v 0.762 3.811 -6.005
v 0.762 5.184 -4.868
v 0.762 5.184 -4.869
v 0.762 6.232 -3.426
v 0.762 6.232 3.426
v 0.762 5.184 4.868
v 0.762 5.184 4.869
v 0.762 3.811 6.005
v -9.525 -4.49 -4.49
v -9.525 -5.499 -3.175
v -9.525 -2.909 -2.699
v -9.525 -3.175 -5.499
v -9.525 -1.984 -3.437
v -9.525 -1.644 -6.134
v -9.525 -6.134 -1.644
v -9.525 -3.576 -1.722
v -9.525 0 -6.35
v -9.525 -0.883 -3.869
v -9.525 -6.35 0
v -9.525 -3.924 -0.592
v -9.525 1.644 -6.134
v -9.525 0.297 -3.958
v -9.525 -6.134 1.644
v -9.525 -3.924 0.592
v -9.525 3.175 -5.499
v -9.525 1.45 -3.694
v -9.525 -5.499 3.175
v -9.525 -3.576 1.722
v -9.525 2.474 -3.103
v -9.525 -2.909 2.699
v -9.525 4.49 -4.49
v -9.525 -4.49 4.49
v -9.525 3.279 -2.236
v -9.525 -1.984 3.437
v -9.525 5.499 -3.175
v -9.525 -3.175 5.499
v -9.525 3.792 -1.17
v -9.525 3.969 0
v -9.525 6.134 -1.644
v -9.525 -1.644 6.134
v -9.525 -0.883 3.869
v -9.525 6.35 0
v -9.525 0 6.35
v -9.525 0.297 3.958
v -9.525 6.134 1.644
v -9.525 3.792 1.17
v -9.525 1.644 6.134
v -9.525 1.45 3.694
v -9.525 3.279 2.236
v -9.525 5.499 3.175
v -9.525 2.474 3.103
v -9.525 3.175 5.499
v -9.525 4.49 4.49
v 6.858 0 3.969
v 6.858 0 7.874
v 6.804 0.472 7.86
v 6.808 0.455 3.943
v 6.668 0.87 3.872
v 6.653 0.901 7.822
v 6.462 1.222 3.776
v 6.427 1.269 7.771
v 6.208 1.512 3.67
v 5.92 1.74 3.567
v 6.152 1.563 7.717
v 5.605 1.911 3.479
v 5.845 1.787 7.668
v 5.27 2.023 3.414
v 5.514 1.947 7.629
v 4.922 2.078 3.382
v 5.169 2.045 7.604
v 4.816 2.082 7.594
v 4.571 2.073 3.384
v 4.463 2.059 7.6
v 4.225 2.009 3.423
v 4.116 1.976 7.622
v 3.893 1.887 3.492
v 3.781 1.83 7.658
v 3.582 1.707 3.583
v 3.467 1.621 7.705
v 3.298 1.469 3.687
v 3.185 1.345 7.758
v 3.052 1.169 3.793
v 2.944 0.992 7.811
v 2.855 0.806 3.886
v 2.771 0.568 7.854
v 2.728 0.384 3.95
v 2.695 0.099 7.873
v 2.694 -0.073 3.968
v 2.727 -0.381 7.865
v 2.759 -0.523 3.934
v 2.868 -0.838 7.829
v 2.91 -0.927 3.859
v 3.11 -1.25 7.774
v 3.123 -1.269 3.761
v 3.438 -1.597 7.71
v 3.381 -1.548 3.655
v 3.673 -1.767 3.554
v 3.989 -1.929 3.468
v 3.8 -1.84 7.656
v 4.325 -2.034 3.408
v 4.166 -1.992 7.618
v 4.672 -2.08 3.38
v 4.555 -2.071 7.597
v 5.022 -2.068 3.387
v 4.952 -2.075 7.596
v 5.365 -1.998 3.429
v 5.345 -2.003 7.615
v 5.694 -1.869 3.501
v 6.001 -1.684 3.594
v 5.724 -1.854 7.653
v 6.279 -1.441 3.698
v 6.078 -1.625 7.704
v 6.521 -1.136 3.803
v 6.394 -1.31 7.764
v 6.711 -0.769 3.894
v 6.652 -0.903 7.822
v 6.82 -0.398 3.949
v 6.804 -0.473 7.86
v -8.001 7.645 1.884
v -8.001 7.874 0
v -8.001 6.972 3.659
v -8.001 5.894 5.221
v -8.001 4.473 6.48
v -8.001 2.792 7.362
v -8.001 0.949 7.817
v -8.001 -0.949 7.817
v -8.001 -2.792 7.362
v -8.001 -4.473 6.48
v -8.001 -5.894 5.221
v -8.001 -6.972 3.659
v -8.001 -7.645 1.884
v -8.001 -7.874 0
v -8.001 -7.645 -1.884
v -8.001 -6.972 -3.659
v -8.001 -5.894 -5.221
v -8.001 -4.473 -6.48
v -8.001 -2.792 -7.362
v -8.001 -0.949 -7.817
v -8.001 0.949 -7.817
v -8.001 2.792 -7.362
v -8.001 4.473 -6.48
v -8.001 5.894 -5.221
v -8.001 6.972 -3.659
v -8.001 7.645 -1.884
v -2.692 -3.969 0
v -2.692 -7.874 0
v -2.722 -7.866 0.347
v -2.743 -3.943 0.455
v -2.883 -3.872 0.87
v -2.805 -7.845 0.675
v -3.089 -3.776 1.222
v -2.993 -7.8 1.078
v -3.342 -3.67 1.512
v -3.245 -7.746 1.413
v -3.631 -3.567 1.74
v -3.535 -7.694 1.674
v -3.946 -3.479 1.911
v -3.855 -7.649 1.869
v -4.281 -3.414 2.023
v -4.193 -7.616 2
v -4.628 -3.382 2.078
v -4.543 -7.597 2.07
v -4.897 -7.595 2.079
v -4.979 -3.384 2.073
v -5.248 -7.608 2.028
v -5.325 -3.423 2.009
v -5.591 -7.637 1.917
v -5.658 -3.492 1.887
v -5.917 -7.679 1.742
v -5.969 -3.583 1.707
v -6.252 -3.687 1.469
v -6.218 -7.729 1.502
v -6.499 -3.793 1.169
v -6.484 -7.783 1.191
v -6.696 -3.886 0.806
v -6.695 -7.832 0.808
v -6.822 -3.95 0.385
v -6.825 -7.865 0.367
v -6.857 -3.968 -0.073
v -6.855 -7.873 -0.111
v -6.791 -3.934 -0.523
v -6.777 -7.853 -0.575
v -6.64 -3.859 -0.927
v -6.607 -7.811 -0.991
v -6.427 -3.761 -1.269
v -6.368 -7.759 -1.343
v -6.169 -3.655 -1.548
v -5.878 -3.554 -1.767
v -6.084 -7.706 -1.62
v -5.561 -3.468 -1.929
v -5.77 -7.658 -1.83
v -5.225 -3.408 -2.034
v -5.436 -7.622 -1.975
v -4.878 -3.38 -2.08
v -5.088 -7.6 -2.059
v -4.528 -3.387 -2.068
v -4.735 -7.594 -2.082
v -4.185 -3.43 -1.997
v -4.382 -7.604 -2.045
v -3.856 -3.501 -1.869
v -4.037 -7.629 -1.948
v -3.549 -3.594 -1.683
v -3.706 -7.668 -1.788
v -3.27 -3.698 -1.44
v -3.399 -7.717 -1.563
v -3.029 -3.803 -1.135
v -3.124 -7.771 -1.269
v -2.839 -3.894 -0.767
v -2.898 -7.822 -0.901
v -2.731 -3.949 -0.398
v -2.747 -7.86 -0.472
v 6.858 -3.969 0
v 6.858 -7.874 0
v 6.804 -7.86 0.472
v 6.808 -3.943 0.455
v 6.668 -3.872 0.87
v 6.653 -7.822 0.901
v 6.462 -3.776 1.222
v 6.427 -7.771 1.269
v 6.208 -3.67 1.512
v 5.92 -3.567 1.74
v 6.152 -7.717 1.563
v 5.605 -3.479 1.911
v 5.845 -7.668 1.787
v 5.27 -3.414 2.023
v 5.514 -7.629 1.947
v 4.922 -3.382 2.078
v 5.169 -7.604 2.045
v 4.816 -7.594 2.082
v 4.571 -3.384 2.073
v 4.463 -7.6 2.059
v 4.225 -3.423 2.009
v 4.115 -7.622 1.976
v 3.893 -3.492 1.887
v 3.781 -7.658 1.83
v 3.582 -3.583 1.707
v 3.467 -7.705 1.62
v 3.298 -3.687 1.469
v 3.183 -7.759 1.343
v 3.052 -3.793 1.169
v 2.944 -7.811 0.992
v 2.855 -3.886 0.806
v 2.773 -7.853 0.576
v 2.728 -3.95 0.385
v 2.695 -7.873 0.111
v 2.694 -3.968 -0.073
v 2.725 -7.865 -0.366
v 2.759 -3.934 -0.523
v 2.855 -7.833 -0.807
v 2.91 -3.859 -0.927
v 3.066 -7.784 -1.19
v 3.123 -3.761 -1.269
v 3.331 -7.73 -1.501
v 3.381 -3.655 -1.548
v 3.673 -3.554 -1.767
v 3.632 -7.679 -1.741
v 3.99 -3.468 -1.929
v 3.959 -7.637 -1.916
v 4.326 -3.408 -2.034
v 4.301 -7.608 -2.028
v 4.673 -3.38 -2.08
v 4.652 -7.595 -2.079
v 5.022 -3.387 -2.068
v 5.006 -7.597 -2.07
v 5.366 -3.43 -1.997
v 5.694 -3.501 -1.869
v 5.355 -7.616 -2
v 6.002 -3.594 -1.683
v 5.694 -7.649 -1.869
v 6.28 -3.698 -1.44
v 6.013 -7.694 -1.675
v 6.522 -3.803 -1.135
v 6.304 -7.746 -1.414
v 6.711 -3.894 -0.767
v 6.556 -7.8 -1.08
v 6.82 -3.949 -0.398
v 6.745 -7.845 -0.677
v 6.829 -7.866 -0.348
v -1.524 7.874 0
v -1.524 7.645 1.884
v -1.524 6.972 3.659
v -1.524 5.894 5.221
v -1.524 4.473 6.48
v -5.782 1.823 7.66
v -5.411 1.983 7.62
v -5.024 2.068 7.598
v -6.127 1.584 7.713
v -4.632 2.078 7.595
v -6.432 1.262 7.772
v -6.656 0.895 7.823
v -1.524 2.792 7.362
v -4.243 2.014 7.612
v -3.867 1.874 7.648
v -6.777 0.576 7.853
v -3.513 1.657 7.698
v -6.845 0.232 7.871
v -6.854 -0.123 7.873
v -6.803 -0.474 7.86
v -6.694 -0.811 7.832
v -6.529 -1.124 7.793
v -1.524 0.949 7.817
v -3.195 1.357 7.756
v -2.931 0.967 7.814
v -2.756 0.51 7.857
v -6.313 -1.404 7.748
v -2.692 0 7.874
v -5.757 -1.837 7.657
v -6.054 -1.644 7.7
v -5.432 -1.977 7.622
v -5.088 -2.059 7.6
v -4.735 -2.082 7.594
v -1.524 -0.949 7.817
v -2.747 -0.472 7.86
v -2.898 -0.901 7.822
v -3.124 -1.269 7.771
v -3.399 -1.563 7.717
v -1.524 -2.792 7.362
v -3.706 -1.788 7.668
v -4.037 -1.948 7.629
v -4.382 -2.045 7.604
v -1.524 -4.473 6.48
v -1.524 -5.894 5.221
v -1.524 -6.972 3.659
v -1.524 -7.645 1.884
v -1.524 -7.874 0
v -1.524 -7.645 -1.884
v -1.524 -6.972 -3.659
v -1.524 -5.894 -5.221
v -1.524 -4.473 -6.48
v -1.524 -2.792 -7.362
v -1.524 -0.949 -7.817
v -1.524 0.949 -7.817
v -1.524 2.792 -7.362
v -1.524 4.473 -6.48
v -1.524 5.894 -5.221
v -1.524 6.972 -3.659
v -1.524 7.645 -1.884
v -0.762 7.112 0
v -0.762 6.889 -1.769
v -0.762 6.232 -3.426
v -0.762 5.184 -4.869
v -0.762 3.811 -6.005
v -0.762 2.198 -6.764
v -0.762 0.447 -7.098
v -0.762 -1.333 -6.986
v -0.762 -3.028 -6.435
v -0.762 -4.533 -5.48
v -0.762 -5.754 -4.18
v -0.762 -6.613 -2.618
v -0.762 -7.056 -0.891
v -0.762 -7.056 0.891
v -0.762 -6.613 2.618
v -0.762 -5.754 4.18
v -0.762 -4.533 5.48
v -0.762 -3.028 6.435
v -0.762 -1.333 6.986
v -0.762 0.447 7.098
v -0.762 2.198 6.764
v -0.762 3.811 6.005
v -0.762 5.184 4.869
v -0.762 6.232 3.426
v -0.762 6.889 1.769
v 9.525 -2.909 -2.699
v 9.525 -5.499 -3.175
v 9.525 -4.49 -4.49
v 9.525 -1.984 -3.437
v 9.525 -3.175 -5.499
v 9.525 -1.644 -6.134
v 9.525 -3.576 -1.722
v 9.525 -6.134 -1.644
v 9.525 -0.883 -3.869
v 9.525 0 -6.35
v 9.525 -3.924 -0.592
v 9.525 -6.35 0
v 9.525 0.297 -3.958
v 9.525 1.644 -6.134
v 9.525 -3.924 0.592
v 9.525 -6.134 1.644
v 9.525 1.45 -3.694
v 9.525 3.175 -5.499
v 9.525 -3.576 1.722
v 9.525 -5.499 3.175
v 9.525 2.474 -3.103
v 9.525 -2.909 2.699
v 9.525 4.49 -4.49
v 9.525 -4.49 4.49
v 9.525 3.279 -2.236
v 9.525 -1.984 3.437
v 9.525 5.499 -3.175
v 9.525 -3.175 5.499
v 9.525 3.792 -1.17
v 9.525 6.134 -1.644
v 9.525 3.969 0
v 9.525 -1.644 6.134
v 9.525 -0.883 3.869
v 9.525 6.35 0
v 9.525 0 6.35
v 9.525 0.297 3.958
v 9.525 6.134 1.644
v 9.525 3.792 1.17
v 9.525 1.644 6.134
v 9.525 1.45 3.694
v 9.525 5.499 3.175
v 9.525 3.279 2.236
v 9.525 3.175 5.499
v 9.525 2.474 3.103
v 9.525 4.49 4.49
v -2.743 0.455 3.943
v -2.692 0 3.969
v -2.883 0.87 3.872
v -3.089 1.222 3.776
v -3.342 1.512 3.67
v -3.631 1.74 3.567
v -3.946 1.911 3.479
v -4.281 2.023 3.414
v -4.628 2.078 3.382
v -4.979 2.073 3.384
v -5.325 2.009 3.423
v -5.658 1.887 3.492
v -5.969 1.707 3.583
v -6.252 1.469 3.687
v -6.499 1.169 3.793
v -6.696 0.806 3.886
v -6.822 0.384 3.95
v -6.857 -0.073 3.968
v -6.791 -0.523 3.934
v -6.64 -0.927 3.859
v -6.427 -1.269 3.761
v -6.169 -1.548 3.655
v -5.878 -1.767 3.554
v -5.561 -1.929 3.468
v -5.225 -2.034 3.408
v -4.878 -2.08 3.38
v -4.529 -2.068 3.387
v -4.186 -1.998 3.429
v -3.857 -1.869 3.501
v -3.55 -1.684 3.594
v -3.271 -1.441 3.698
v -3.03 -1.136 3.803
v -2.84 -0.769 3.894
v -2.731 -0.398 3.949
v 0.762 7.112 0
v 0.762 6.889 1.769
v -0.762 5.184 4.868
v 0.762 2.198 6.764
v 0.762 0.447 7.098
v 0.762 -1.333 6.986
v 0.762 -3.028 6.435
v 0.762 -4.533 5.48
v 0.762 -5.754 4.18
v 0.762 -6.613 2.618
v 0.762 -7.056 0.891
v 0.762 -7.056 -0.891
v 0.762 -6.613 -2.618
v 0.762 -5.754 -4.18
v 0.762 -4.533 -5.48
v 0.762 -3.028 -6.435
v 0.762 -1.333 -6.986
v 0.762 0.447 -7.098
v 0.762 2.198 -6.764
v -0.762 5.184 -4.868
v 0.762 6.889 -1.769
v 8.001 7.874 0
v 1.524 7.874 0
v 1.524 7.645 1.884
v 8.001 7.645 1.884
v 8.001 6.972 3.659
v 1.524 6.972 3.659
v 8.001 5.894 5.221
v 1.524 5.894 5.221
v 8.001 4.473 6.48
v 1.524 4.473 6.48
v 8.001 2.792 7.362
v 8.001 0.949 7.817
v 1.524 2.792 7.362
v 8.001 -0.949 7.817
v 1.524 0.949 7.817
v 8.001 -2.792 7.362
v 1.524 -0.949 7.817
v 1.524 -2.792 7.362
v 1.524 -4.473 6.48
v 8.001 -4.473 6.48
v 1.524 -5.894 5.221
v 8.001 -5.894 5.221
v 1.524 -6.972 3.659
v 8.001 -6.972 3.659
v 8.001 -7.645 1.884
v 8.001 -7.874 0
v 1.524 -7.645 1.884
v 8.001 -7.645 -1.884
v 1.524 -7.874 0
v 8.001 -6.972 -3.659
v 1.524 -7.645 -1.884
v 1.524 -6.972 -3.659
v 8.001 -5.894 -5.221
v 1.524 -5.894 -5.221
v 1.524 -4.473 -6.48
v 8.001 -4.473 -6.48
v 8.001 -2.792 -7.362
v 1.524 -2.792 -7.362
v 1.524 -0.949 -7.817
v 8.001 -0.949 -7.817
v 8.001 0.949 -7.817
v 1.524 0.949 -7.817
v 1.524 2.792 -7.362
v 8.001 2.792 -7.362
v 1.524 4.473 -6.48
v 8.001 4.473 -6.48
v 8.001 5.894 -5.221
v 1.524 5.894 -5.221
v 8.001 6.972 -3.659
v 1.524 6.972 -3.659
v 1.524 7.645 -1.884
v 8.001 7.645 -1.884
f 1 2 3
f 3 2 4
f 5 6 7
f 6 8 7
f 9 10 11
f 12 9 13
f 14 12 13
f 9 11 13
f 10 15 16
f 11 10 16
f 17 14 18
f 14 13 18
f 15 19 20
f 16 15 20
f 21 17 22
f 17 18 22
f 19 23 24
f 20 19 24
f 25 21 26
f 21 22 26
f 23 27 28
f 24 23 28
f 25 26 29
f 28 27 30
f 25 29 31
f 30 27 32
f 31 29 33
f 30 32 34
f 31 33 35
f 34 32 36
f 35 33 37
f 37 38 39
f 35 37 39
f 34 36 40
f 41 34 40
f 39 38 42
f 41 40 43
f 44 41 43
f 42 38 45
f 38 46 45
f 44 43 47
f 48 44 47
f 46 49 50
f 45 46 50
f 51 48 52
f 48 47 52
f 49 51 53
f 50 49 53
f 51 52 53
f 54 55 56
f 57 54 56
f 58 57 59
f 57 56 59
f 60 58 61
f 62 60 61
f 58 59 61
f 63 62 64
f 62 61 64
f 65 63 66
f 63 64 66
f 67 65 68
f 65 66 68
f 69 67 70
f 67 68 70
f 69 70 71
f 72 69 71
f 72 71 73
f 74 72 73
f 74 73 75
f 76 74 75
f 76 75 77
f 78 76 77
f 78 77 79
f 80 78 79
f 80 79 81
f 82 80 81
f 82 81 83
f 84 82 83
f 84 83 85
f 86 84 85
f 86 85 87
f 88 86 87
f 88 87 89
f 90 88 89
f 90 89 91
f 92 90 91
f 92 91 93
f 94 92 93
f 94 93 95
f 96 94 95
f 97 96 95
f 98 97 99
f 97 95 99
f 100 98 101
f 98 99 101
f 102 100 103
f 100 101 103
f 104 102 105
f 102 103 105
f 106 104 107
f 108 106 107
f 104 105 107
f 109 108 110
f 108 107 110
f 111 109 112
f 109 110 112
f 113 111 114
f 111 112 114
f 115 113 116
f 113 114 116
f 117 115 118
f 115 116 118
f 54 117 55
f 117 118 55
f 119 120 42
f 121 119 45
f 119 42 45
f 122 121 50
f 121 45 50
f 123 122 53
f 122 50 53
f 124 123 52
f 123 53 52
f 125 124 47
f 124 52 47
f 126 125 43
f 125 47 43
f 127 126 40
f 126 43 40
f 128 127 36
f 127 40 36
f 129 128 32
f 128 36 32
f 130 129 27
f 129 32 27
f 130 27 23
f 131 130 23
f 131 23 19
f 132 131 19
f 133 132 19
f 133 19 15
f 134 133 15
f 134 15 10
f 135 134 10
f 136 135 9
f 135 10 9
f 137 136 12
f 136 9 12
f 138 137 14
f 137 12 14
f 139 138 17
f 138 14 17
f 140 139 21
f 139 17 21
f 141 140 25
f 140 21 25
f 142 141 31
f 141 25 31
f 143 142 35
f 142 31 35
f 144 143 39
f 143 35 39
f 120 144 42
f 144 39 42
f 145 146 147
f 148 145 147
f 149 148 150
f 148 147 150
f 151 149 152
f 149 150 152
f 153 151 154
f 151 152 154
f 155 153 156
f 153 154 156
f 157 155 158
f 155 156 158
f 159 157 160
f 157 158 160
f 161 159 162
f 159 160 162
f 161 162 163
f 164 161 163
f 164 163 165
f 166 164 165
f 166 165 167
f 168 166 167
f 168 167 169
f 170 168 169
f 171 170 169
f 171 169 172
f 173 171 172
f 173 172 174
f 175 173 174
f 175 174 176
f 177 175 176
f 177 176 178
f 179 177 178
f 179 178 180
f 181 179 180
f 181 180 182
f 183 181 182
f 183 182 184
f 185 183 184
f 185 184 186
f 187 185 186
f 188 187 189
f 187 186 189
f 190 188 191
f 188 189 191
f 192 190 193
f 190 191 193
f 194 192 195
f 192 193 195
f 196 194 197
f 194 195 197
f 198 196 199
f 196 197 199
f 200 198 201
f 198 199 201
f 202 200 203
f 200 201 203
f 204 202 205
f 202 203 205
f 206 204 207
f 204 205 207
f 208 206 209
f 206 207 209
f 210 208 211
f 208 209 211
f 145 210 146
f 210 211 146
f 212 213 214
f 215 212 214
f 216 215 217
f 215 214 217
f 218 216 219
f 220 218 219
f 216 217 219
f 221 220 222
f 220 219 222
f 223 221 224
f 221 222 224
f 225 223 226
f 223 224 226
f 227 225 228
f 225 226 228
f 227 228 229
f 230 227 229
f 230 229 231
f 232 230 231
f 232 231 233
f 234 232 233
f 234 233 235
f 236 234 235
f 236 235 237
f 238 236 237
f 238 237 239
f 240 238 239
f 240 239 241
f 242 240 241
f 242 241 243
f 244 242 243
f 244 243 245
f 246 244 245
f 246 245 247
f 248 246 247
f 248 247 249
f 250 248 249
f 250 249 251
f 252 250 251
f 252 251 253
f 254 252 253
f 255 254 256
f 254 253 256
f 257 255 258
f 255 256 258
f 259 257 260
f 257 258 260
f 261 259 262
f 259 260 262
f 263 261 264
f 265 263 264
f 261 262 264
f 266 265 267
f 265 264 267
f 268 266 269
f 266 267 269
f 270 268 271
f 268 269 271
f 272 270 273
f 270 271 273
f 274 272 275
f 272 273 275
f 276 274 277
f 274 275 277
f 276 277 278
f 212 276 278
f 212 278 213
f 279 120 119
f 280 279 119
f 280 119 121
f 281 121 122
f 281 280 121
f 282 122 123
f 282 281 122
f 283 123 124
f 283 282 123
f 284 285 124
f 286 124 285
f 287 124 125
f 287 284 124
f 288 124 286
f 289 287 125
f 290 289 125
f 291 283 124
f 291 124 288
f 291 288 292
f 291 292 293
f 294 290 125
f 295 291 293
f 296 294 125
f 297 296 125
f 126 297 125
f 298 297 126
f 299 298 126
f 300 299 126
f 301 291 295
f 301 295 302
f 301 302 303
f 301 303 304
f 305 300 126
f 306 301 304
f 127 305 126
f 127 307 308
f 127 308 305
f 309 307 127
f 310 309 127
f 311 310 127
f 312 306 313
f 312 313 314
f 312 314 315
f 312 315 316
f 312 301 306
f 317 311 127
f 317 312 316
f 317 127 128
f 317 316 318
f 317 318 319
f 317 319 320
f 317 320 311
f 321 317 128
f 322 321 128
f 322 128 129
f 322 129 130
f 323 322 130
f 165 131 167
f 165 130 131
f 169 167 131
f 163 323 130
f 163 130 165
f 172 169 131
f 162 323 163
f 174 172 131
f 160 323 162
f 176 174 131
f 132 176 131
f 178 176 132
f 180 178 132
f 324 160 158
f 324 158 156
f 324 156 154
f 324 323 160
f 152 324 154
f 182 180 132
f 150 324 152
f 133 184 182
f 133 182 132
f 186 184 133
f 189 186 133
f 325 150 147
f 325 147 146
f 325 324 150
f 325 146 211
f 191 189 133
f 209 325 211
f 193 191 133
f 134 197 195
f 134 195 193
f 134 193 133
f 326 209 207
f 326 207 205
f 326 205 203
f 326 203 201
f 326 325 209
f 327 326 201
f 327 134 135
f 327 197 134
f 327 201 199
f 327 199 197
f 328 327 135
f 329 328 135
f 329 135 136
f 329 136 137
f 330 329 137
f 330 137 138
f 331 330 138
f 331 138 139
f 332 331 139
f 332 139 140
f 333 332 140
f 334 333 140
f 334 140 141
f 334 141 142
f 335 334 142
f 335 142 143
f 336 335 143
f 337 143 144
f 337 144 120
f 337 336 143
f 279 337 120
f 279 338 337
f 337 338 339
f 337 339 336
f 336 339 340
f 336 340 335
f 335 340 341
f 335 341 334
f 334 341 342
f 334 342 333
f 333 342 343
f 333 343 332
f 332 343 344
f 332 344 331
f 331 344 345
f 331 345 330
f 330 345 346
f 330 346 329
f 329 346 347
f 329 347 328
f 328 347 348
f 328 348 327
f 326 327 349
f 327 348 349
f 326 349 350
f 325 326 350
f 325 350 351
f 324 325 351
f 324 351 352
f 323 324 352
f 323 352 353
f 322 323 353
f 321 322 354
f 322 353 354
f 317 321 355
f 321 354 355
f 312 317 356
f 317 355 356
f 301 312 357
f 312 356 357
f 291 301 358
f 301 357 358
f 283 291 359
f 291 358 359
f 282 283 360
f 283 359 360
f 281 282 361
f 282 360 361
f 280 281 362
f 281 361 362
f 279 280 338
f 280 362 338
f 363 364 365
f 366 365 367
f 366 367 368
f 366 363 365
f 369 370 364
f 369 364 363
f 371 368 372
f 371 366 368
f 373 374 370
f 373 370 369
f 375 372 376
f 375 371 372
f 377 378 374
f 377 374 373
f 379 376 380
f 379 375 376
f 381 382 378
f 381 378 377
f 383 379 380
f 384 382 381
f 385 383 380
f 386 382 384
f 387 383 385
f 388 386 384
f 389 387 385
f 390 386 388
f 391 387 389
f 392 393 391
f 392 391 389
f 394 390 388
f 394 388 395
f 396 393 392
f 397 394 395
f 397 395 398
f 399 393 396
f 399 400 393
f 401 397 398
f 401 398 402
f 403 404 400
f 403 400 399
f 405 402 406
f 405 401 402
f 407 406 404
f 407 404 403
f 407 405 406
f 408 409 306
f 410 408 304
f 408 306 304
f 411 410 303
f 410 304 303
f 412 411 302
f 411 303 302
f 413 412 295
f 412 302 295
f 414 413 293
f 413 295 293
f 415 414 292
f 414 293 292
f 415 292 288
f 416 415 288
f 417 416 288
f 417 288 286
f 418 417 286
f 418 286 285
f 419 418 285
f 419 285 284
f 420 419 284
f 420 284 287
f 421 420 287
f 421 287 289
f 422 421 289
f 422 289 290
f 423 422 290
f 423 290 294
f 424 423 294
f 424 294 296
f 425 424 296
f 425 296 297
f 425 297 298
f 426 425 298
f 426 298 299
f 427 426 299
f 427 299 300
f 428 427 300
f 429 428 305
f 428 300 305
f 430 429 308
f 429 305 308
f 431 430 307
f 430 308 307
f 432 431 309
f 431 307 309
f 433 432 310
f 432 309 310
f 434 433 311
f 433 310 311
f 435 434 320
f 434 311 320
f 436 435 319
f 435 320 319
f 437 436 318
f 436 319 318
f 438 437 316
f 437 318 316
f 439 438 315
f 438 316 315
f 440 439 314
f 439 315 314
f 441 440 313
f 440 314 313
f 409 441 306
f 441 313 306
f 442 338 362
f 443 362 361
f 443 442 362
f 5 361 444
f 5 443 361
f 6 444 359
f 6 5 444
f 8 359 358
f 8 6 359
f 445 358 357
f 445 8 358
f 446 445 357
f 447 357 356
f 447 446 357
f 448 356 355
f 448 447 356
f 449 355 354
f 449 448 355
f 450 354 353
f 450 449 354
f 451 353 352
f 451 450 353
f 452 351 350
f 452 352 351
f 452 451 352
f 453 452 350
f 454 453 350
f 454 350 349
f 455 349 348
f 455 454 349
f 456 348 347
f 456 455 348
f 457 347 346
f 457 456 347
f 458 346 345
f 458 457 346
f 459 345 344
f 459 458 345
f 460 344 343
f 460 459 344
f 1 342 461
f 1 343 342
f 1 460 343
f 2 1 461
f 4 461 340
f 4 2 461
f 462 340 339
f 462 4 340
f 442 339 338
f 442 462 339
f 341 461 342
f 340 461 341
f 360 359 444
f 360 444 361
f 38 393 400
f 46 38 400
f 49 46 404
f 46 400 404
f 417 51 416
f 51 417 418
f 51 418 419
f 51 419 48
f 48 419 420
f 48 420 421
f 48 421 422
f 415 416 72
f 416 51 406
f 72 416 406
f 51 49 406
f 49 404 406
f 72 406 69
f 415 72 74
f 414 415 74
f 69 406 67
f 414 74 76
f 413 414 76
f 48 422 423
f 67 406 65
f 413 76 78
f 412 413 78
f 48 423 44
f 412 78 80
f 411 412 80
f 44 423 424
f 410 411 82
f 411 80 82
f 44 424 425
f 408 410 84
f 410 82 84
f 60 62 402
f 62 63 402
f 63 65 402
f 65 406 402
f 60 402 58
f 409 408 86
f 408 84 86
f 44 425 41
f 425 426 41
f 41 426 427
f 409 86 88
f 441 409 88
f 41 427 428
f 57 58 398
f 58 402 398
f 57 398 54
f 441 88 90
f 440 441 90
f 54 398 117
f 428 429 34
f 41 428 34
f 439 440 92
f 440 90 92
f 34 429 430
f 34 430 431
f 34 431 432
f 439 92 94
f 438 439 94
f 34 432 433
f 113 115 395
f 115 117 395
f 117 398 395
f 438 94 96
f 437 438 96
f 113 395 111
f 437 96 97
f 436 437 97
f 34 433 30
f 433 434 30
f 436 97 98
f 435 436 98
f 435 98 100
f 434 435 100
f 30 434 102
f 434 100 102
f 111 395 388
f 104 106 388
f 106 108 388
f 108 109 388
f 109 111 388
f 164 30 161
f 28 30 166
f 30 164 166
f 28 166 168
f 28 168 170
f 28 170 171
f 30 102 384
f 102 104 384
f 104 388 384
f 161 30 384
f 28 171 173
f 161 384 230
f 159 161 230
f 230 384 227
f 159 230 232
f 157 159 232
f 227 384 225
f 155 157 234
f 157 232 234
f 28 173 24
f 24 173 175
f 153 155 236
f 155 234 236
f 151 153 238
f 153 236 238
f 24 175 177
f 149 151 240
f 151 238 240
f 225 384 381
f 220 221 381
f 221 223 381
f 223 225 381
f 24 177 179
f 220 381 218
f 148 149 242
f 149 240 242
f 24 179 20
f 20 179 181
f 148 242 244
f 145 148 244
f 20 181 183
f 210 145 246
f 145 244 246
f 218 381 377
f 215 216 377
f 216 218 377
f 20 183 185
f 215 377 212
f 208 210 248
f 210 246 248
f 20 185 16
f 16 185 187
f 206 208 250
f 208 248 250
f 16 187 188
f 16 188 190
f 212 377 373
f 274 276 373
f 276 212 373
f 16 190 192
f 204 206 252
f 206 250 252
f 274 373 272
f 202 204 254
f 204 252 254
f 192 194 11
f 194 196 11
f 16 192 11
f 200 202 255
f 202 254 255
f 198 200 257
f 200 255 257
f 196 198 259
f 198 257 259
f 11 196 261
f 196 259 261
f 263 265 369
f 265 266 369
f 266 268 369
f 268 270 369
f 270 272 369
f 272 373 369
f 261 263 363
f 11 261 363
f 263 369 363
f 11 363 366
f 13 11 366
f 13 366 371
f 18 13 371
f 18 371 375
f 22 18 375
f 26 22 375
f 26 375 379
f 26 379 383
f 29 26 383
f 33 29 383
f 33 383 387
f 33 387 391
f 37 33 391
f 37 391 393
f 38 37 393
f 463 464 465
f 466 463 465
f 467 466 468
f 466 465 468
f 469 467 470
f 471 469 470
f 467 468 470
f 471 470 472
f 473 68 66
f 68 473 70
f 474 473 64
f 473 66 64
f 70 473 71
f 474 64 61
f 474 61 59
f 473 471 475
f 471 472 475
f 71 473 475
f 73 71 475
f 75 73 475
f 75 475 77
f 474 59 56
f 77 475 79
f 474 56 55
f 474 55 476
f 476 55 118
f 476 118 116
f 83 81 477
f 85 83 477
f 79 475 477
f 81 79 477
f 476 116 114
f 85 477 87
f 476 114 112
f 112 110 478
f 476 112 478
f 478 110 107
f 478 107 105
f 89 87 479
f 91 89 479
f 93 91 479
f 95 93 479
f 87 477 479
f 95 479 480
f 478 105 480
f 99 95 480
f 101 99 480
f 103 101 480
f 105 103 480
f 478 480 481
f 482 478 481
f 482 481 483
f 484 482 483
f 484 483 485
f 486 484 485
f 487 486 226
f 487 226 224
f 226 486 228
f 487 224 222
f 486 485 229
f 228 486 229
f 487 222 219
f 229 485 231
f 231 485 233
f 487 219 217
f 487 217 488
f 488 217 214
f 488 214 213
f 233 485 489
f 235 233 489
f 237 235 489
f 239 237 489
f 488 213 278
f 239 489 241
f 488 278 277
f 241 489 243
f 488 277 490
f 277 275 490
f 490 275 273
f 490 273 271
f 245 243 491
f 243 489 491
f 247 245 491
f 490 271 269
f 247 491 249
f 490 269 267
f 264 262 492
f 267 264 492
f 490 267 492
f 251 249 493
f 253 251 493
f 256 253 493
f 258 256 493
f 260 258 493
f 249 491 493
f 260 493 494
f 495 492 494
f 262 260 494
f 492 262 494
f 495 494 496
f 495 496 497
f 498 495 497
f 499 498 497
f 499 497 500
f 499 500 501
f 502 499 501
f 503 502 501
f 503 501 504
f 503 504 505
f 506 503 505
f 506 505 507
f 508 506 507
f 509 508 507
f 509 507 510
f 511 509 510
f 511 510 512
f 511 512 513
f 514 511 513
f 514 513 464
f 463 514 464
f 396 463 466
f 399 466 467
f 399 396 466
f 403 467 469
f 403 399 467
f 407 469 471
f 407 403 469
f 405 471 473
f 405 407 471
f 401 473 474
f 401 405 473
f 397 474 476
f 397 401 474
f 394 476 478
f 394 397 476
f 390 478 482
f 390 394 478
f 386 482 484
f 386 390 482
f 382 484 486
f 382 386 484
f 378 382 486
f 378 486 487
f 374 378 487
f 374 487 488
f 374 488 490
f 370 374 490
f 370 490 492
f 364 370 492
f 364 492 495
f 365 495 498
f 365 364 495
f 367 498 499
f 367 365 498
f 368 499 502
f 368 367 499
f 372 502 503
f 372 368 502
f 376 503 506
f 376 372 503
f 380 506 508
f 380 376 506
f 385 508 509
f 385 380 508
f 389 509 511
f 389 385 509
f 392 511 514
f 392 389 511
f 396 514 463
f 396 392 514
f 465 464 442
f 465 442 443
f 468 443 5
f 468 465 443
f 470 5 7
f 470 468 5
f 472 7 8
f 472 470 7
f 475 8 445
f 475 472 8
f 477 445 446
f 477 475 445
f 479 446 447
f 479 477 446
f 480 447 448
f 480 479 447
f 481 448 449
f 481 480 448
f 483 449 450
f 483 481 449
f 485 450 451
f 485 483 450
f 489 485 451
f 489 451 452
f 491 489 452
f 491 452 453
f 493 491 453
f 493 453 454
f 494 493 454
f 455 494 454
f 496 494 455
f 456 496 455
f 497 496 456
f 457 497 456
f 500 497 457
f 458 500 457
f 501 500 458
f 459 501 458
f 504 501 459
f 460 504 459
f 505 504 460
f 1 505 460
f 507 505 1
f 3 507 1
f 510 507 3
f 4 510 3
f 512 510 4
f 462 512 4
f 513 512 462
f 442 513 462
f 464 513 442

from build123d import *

# Parameters (mm, degrees)
F0_R          = 7.112
F1_DEPTH      = 0.762
F1_DEPTH_BACK = 0.762
F2_R          = 7.874
F2_R_2        = 7.112
F3_DEPTH      = 8.763
F4_R          = 7.874
F4_R_2        = 7.112
F5_DEPTH      = 8.763
F9_R          = 3.96875
F10_DEPTH     = 25.4
F8_R          = 2.0828
F11_DEPTH     = 7.62
F14_R         = 2.0828
F15_DEPTH     = 7.874
F16_SIZE      = 1.524
F17_SIZE      = 0.76199


# Not quite as in the source:
# - a fillet or chamfer is up to 0.001 mm smaller than in the source, because OpenCascade refuses the exact size
# - a pattern or mirror of a feature is missing from the dataset's text; its kind, count and spacing are read off the source's solid


with BuildPart() as f1:
    # F0 (on Right) → F1 (new body, two sides)
    with BuildSketch(Plane.YZ) as f1_sk:
        Circle(F0_R)
    extrude(amount=F1_DEPTH)
    extrude(f1_sk.sketch, amount=-F1_DEPTH_BACK)

    # F2 (on face) → F3 (join)
    with BuildSketch(Plane.YZ.offset(0.762)):
        Circle(F2_R)
        Circle(F2_R_2, mode=Mode.SUBTRACT)
        Circle(F2_R_2)
    f3 = extrude(amount=F3_DEPTH)

    # F3_copies: F3 across plane
    add(f3.mirror(Plane(origin=(0, 0, 0), x_dir=(0, 0, -1), z_dir=(-1, 0, 0))))

    # F4 (on face) → F5 (join)
    with BuildSketch(Plane(origin=(-0.762, 0, 0), x_dir=(0, -1, 0), z_dir=(-1, 0, 0))):
        Circle(F4_R)
        Circle(F4_R_2, mode=Mode.SUBTRACT)
    extrude(amount=F5_DEPTH)

    # F9 (on face) → F10 (cut)
    with BuildSketch(Plane.YZ.offset(9.525)):
        Circle(F9_R)
    extrude(amount=-F10_DEPTH, mode=Mode.SUBTRACT)

    # F8 (on plane+point) → F11 (cut)
    with BuildSketch(Plane.XY.offset(7.874)):
        with Locations((4.7752, 0)):
            Circle(F8_R)
        with Locations((-4.7752, 0)):
            Circle(F8_R)
    extrude(amount=-F11_DEPTH, mode=Mode.SUBTRACT)

    # F14 (on plane+point) → F15 (cut)
    with BuildSketch(Plane.XZ.offset(7.874)):
        with Locations((4.7752, 0)):
            Circle(F14_R)
        with Locations((-4.7752, 0)):
            Circle(F14_R)
    extrude(amount=-F15_DEPTH, mode=Mode.SUBTRACT)

    # F16
    f16_edges = [f1.edges().sort_by_distance(p)[0] for p in [
        (9.525, -7.874, 0),
        (-9.525, -7.874, 0),
    ]]
    chamfer(f16_edges, length=F16_SIZE)

    # F17 (size 0.762 in the source; OpenCascade refuses exactly that, so slightly less here)
    f17_edges = [f1.edges().sort_by_distance(p)[0] for p in [
        (0.762, -7.874, 0),
        (-0.762, -7.874, 0),
    ]]
    chamfer(f17_edges, length=F17_SIZE)


solid = f1.part
